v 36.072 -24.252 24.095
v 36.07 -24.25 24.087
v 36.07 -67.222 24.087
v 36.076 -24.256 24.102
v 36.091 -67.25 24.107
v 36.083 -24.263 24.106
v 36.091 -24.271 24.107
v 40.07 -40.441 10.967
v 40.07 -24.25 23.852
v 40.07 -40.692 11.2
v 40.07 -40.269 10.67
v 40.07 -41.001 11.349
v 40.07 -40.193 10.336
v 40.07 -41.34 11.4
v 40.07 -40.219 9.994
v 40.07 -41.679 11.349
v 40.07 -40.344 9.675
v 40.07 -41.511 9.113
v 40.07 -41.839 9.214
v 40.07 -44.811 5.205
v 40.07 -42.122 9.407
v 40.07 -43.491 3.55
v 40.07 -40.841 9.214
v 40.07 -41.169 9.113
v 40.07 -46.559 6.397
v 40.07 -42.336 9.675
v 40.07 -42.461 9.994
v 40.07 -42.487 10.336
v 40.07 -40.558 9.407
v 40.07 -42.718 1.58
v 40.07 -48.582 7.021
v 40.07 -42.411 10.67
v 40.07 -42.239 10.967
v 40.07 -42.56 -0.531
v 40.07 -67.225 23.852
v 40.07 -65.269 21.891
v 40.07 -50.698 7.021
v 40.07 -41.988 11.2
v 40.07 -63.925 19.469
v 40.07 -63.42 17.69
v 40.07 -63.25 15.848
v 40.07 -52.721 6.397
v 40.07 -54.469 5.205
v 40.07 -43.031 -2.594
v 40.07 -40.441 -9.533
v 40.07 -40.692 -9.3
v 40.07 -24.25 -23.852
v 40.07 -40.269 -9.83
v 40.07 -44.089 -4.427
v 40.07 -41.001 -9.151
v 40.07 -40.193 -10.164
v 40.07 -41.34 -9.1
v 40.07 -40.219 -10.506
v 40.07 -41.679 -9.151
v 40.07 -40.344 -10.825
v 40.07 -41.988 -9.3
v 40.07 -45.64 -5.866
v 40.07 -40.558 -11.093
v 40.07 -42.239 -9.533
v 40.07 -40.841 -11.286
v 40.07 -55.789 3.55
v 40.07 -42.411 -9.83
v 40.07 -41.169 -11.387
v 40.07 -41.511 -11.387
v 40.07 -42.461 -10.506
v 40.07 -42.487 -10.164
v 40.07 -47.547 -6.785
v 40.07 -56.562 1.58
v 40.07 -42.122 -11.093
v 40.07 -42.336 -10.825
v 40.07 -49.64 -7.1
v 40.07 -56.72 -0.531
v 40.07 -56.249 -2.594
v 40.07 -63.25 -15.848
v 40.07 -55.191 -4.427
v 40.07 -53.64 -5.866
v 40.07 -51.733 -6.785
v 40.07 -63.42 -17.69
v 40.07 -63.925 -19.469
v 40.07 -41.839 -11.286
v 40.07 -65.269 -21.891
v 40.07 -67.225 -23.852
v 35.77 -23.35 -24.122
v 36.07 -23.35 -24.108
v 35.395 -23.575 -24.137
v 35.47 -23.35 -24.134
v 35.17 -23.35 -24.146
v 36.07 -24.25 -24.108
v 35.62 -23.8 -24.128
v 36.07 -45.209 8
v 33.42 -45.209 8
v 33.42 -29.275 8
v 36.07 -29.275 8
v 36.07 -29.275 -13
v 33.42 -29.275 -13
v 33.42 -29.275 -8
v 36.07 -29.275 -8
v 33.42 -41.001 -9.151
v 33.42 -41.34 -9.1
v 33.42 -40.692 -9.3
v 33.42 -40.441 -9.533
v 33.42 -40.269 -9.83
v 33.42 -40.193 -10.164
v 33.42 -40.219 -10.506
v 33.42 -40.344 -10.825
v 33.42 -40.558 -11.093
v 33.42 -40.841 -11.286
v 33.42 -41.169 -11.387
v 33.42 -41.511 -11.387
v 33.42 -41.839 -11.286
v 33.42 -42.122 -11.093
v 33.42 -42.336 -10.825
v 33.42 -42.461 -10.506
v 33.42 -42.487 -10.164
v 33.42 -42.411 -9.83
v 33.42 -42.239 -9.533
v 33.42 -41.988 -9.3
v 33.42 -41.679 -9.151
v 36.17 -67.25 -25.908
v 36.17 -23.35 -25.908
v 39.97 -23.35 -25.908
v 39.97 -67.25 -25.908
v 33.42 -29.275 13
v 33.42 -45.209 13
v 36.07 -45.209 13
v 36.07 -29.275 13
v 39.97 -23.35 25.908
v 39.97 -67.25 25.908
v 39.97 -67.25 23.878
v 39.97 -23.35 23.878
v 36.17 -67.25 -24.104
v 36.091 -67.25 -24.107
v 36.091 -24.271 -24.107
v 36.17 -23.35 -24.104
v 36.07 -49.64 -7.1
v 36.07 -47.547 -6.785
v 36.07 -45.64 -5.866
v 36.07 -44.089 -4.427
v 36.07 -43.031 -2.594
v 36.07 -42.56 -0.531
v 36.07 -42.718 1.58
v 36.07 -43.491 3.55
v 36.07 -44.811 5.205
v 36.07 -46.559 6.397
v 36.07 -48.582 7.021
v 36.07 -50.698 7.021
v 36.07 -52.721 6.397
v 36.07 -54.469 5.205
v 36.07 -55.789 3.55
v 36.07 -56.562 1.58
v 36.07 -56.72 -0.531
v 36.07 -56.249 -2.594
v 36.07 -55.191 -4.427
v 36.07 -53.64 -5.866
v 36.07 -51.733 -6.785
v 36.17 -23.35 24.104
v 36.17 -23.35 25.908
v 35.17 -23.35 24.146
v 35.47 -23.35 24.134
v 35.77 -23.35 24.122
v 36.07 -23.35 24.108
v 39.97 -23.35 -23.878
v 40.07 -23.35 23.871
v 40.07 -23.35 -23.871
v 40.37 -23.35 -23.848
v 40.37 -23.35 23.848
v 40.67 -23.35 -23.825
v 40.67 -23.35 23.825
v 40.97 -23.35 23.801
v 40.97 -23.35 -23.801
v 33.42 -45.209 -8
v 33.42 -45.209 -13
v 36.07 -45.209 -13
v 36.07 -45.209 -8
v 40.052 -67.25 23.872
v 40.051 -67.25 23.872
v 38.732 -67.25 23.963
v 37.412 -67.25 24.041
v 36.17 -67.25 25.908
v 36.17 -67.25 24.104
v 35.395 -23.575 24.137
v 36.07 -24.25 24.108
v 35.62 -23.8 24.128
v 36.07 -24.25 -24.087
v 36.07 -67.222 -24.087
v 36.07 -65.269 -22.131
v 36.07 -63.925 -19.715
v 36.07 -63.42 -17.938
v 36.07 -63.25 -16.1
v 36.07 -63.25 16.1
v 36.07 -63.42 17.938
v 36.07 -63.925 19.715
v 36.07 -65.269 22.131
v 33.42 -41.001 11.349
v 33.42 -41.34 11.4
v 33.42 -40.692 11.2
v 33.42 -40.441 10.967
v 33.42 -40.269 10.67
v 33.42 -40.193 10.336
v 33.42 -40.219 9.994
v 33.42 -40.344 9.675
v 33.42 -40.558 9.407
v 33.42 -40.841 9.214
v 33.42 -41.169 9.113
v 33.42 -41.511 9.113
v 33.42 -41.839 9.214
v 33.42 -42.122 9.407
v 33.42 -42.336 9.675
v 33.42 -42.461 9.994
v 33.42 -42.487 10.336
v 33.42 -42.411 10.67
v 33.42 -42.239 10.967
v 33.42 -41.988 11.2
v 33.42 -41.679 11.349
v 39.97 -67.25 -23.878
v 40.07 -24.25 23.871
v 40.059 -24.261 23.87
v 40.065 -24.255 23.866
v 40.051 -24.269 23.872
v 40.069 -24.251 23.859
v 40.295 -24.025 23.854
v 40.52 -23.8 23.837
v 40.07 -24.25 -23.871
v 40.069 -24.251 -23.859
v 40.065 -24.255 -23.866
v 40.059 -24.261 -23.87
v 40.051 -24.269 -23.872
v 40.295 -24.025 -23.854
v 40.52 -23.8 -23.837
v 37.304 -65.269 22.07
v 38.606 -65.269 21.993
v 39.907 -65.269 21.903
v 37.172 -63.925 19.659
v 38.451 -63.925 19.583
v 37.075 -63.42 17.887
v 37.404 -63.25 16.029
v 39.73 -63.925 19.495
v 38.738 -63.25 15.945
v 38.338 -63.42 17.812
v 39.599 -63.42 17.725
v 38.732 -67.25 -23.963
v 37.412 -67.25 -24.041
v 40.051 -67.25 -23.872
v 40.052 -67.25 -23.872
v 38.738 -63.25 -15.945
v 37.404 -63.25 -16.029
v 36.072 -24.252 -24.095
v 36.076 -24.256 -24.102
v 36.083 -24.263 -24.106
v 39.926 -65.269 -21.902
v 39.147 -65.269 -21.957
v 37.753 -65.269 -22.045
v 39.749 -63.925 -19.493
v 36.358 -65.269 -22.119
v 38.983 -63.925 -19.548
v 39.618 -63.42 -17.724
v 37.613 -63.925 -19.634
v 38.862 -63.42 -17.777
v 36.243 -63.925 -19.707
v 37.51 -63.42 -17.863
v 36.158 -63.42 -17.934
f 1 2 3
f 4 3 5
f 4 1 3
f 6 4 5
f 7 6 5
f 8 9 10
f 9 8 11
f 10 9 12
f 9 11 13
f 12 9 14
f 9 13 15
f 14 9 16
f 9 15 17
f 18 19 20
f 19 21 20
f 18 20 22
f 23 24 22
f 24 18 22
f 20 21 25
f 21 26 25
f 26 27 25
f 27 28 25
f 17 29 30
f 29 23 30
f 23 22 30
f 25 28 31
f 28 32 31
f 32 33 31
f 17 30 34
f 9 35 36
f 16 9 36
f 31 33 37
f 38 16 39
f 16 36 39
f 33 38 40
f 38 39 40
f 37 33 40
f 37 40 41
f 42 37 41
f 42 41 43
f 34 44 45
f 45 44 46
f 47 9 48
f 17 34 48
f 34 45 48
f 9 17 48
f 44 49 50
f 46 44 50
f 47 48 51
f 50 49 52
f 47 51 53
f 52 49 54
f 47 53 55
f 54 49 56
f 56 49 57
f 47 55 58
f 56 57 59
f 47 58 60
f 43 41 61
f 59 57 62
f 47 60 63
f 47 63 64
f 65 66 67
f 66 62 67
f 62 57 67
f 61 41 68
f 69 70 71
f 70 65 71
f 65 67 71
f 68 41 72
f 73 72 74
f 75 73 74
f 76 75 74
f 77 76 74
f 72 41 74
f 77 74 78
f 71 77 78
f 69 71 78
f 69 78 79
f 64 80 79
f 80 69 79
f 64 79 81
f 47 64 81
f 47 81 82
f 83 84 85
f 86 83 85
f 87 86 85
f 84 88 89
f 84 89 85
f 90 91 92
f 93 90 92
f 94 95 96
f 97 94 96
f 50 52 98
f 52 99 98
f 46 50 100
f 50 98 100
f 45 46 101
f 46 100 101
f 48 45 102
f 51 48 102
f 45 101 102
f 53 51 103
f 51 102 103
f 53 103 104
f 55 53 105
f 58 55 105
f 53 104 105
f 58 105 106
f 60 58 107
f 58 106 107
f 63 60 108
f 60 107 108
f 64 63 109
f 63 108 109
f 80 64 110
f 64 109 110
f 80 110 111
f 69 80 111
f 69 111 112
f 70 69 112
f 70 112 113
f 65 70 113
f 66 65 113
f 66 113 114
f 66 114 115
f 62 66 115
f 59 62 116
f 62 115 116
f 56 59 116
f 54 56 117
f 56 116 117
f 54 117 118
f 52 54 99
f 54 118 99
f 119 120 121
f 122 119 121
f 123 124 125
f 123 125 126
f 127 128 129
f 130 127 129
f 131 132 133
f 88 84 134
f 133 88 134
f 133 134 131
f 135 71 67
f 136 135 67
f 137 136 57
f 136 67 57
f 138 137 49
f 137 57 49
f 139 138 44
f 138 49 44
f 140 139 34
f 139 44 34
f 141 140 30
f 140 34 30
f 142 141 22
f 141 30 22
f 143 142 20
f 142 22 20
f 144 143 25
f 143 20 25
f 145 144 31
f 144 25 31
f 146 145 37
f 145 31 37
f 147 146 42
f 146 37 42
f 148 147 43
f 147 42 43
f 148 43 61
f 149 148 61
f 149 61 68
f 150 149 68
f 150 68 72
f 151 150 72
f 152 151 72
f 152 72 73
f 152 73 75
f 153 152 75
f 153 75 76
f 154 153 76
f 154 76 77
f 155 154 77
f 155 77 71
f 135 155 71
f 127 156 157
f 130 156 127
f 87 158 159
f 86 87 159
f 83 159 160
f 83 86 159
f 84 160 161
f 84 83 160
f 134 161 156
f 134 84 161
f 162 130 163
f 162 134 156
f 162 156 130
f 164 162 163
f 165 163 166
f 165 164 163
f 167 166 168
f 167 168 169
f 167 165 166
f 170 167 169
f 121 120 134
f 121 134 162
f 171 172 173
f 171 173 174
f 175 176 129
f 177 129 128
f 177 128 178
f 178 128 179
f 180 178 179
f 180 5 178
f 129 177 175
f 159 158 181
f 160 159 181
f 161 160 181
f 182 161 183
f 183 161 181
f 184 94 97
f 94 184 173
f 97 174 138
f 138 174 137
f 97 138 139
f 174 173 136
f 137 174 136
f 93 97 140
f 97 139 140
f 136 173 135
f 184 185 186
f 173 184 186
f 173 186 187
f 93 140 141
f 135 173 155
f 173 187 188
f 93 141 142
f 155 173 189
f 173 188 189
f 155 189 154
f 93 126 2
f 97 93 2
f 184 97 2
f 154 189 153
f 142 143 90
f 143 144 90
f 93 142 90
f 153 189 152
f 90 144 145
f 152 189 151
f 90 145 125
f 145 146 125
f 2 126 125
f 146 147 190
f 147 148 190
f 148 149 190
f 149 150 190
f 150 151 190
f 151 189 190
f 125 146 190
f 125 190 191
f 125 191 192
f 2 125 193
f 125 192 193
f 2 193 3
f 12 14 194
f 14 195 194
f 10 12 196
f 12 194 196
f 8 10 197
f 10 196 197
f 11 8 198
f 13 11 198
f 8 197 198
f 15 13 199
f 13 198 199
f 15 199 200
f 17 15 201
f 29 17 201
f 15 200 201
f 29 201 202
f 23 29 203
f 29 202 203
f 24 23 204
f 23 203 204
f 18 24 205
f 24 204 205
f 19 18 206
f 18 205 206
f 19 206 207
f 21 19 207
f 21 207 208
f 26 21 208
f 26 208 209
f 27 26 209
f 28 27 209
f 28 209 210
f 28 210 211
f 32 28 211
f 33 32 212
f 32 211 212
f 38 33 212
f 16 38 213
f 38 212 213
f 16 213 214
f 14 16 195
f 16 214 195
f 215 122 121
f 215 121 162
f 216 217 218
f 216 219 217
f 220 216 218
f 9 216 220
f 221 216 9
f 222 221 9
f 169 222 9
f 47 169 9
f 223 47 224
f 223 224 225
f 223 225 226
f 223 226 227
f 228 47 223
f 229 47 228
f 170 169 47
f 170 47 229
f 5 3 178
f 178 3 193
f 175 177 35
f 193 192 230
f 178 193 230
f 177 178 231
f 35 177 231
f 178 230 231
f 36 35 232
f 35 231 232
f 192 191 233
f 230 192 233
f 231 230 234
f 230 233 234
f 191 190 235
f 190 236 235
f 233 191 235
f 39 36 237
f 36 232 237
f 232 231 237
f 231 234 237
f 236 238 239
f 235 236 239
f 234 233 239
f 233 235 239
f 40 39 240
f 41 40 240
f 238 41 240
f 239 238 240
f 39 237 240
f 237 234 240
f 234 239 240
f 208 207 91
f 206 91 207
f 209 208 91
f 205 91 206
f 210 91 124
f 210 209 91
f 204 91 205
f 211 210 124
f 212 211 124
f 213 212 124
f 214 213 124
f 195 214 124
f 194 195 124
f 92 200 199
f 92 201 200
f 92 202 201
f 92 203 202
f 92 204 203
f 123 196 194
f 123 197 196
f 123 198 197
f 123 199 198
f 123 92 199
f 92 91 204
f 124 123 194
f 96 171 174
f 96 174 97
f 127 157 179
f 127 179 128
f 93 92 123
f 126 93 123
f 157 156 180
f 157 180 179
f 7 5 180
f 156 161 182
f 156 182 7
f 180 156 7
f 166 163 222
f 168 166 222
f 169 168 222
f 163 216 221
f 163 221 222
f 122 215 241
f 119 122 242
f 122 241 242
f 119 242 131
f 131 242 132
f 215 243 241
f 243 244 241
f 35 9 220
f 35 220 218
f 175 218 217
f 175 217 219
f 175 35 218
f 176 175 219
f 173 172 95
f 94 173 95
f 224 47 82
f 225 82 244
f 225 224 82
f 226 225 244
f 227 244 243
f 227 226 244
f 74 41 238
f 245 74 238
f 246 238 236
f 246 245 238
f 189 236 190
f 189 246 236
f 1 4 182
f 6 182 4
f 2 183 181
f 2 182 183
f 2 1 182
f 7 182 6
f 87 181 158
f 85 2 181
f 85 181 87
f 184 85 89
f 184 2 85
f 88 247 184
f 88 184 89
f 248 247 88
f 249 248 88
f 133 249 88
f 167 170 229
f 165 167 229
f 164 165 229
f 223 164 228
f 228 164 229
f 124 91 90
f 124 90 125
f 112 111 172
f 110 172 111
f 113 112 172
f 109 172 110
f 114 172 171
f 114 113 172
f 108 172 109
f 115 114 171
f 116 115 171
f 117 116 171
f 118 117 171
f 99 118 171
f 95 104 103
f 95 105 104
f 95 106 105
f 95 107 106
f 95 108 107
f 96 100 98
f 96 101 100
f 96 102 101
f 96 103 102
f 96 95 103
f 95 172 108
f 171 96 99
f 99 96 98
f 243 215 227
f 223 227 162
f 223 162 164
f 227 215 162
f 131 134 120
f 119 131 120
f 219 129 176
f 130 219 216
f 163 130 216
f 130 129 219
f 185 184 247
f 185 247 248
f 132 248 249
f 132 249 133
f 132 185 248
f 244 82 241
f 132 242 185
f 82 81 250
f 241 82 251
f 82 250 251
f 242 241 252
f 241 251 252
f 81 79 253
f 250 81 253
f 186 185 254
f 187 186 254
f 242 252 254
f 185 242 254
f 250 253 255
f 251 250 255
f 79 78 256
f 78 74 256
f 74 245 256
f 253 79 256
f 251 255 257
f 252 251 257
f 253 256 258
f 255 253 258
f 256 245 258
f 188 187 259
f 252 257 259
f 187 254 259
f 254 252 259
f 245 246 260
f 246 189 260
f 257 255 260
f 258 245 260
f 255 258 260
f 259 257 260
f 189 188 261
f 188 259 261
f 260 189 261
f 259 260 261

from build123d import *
from build123d.topology import SkipClean

# Parameters (mm, degrees)
SKETCH1_R                = 4.1
SKETCH1_R_2              = 1.15
BOSS_EXTRUDE1_DEPTH      = 3.5
BOSS_EXTRUDE2_DEPTH      = 67.25
CUT_EXTRUDE1_DEPTH       = 94.994268442
SKETCH4_W                = 26.5
SKETCH4_H                = 47.25
CUT_EXTRUDE2_DEPTH       = 3.5
SKETCH6_W                = 31.5
SKETCH6_H                = 52.25
BOSS_EXTRUDE3_DEPTH      = 2
CHAMFER2_SIZE            = 2
SKETCH7_W                = 26.5
SKETCH7_H                = 47.25
CUT_EXTRUDE3_DEPTH       = 0.8
CUT_EXTRUDE4_REACH       = 97.271
SKETCH8_W                = 21.401119101
SKETCH8_H                = 6.5
CUT_EXTRUDE5_REACH       = 97.271
SKETCH9_R                = 7.1
BOSS_EXTRUDE4_DEPTH      = 3.5
SKETCH11_W               = 4
SKETCH11_H               = 49.717369648
BOSS_EXTRUDE5_DEPTH      = 40
SKETCH12_R               = 7.1
CUT_EXTRUDE6_DEPTH       = 10
CHAMFER3_SIZE            = 1
CHAMFER4_SIZE            = 1
SKETCH13_R               = 9
SKETCH13_R_2             = 5.5
BOSS_EXTRUDE6_DEPTH      = 1.5
SKETCH16_R               = 9
BOSS_EXTRUDE7_DEPTH      = 1
FILLET2_R                = 1
SKETCH18_R               = 9
SKETCH18_R_2             = 7.1
BOSS_EXTRUDE8_DEPTH      = 0.5
CHAMFER5_SIZE            = 0.5
BOSS_EXTRUDE9_DEPTH      = 40.5
CUT_EXTRUDE8_REACH       = 129.458
CHAMFER6_SIZE            = 1.5
CUT_EXTRUDE9_REACH       = 129.458
SKETCH20_R               = 7.1
SKETCH21_R               = 1.5
BOSS_EXTRUDE10_DEPTH     = 3.5
CUT_EXTRUDE10_REACH      = 129.458
SKETCH22_R               = 3.75
SKETCH23_R               = 1.15
BOSS_EXTRUDE11_DEPTH     = 1.82
BOSS_EXTRUDE12_START     = 2.65
SKETCH24_W               = 5
SKETCH24_H               = 15.934069979
SKETCH24_R               = 1.15
BOSS_EXTRUDE12_DEPTH     = 2.65
CUT_EXTRUDE11_REACH      = 118.561
SKETCH25_R               = 1.15
SKETCH26_R               = 13.375
CUT_EXTRUDE12_DEPTH      = 3.3
SKETCH27_R               = 5
BOSS_EXTRUDE13_DEPTH     = 1
FILLET7_R                = 0.75
SKETCH28_R               = 8
SKETCH28_R_2             = 4.1
BOSS_EXTRUDE14_DEPTH     = 1.5
SKETCH29_R               = 8
SKETCH29_R_2             = 4.1
BOSS_EXTRUDE15_DEPTH     = 8.5
CUT_EXTRUDE13_DEPTH      = 15
CUT_EXTRUDE13_DEPTH_BACK = 127.447026853
SKETCH30_R               = 1.125
SKETCH31_R               = 7.1
BOSS_EXTRUDE16_DEPTH     = 0.5
CHAMFER7_SIZE            = 0.5
CHAMFER7_OF_MIRROR5_SIZE = 0.5
FILLET8_R                = 2.5
CUT_EXTRUDE14_DEPTH      = 10
CUT_EXTRUDE14_DEPTH_BACK = 10
SKETCH32_W               = 30.5
SKETCH32_H               = 23.22
FILLET9_R                = 5
CUT_EXTRUDE15_DEPTH      = 2
SKETCH34_R               = 2.25
CUT_EXTRUDE16_DEPTH      = 1.5
CUT_EXTRUDE17_DEPTH      = 133.651095359
CUT_EXTRUDE17_DEPTH_BACK = 2
SKETCH35_W               = 15
SKETCH35_H               = 21.75
FILLET10_R               = 1
FILLET11_R               = 1
SKETCH36_R               = 1.15
CUT_EXTRUDE18_DEPTH      = 127.188133357
CUT_EXTRUDE24_DEPTH      = 107.374679788
CUT_EXTRUDE24_DEPTH_BACK = 107.374679788
SKETCH39_W               = 129.097632358
SKETCH39_H               = 90.611923089
CUT_EXTRUDE25_DEPTH      = 69.011167635
CUT_EXTRUDE25_DEPTH_BACK = 3.5
SKETCH40_W               = 54.925006482
SKETCH40_H               = 71.748882342
CUT_EXTRUDE26_DEPTH      = 66.567961717
FILLET12_R               = 10
CUT_EXTRUDE27_DEPTH      = 0.1
FILLET13_R               = 0.02


# Some blends are built 0.0001 mm under size
with BuildPart() as part:
    # Sketch1 → Boss-Extrude1 (new body)
    with BuildSketch(Plane(origin=(0, 0, 0), x_dir=(0, 0, -1), z_dir=(1, 0, 0))):
        with BuildLine():
            Line((-17.25, 0), (-17.25, -67.25))
            Line((-17.25, -67.25), (17.25, -67.25))
            Line((17.25, -67.25), (17.25, 0))
            ThreePointArc((17.25, 0), (0, 17.25), (-17.25, 0))
        make_face()
        Circle(SKETCH1_R, mode=Mode.SUBTRACT)
        with Locations((0, 8.125)):
            Circle(SKETCH1_R_2, mode=Mode.SUBTRACT)
        with Locations((8.125, 0)):
            Circle(SKETCH1_R_2, mode=Mode.SUBTRACT)
        with Locations((-8.125, 0)):
            Circle(SKETCH1_R_2, mode=Mode.SUBTRACT)
        with Locations((0, -8.125)):
            Circle(SKETCH1_R_2, mode=Mode.SUBTRACT)
    boss_extrude1 = extrude(amount=BOSS_EXTRUDE1_DEPTH)

    # Sketch2 → Boss-Extrude2 (add)
    with BuildSketch(Plane(origin=(0, 0, 0), x_dir=(-1, 0, 0), z_dir=(0, -1, 0))):
        with BuildLine():
            Line((-59.4, -17.25), (-59.4, -20.25))
            ThreePointArc((-59.4, -20.25), (-58.989582055, -21.693064324), (-58.079872716, -22.886088403))
            ThreePointArc((-58.079872716, -22.886088403), (-54.454905265, -25.285822393), (-50.289145158, -26.529025904))
            ThreePointArc((-50.289145158, -26.529025904), (-40.020812264, -27.631788405), (-29.7, -28))
            ThreePointArc((-29.7, -28), (-19.379187736, -27.631788405), (-9.110854842, -26.529025904))
            ThreePointArc((-9.110854842, -26.529025904), (-4.945094735, -25.285822393), (-1.320127284, -22.886088403))
            ThreePointArc((-1.320127284, -22.886088403), (-0.410417945, -21.693064324), (0, -20.25))
            Line((0, -20.25), (0, -17.25))
            Line((0, -17.25), (-3.5, -17.25))
            Line((-3.5, -17.25), (-3.735903774, -19.954735321))
            ThreePointArc((-3.735903774, -19.954735321), (-3.770225997, -20.037754997), (-3.828562802, -20.106071165))
            ThreePointArc((-3.828562802, -20.106071165), (-6.407189742, -21.835001354), (-9.364778442, -22.779027613))
            ThreePointArc((-9.364778442, -22.779027613), (-19.505740765, -23.883479028), (-29.7, -24.2522722))
            ThreePointArc((-29.7, -24.2522722), (-39.894259235, -23.883479028), (-50.035221558, -22.779027613))
            ThreePointArc((-50.035221558, -22.779027613), (-52.992810258, -21.835001354), (-55.571437198, -20.106071165))
            ThreePointArc((-55.571437198, -20.106071165), (-55.629774003, -20.037754997), (-55.664096226, -19.954735321))
            Line((-55.664096226, -19.954735321), (-55.9, -17.25))
            Line((-55.9, -17.25), (-59.4, -17.25))
        make_face()
    boss_extrude2 = extrude(amount=BOSS_EXTRUDE2_DEPTH)

    # Mirror2: Boss-Extrude1 across plane
    add(boss_extrude1.mirror(Plane.ZY.offset(-29.7)))

    # Sketch3 → Cut-Extrude1 (cut, through all)
    with BuildSketch(Plane.ZY):
        Polygon((17.25, 0), (32.748612496, -8.948128097), (32.748612496, 0), align=None)
    cut_extrude1 = extrude(amount=-CUT_EXTRUDE1_DEPTH, mode=Mode.SUBTRACT)

    # Mirror3: Boss-Extrude2, Cut-Extrude1 across plane
    add(boss_extrude2.mirror(Plane(origin=(0, 0, 0), x_dir=(1, 0, 0), z_dir=(0, 0, -1))))
    add(cut_extrude1.mirror(Plane(origin=(0, 0, 0), x_dir=(1, 0, 0), z_dir=(0, 0, -1))), mode=Mode.SUBTRACT)

    # Sketch4 → Cut-Extrude2 (cut)
    with BuildSketch(Plane.ZY):
        with Locations((0, -37.125)):
            Rectangle(SKETCH4_W, SKETCH4_H)
    extrude(amount=-CUT_EXTRUDE2_DEPTH, mode=Mode.SUBTRACT)

    # Sketch6 → Boss-Extrude3 (add)
    with BuildSketch(Plane.ZY):
        with Locations((0, -37.125)):
            Rectangle(SKETCH6_W, SKETCH6_H)
    extrude(amount=BOSS_EXTRUDE3_DEPTH)

    # Chamfer2
    chamfer2_edges = [part.edges().sort_by_distance(p)[0] for p in [
        (-2, -63.25, 0),
        (-2, -37.125, 15.75),
        (-2, -37.125, -15.75),
        (-2, -11, 0),
    ]]
    chamfer(chamfer2_edges, length=CHAMFER2_SIZE - 0.0001)  # a hair under: the kernel refuses the full size

    # Sketch7 → Cut-Extrude3 (cut)
    with BuildSketch(Plane(origin=(0, 0, 0), x_dir=(0, 0, -1), z_dir=(1, 0, 0))):
        with Locations((0, -37.125)):
            Rectangle(SKETCH7_W, SKETCH7_H)
    extrude(amount=-CUT_EXTRUDE3_DEPTH, mode=Mode.SUBTRACT)

    # Sketch8 → Cut-Extrude4 (cut, up to next)
    with BuildSketch(Plane.ZY.offset(2), mode=Mode.PRIVATE) as cut_extrude4_sk1:
        with Locations((0.049440449, -35.5)):
            Rectangle(SKETCH8_W, SKETCH8_H)
    cut_extrude4_tool1 = extrude(cut_extrude4_sk1.sketch, amount=-CUT_EXTRUDE4_REACH, mode=Mode.PRIVATE) & part.part
    add(cut_extrude4_tool1.solids().sort_by_distance((-2, -35.5, 0.04944))[0], mode=Mode.SUBTRACT)

    # Sketch9 → Cut-Extrude5 (cut, up to next)
    with BuildSketch(Plane(origin=(59.4, 0, 0), x_dir=(0, 0, -1), z_dir=(1, 0, 0)), mode=Mode.PRIVATE) as cut_extrude5_sk1:
        with Locations((0, -49.64)):
            Circle(SKETCH9_R)
    cut_extrude5_tool1 = extrude(cut_extrude5_sk1.sketch, amount=-CUT_EXTRUDE5_REACH, mode=Mode.PRIVATE) & part.part
    add(cut_extrude5_tool1.solids().sort_by_distance((59.4, -49.64, 0))[0], mode=Mode.SUBTRACT)

    # Sketch10 → Boss-Extrude4 (add)
    with BuildSketch(Plane(origin=(0, -19.75, 0), x_dir=(-1, 0, 0), z_dir=(0, -1, 0))):
        with BuildLine():
            Line((-55.664096226, -19.954735321), (-55.9, -17.25))
            Line((-55.9, -17.25), (-55.9, 17.25))
            Line((-55.9, 17.25), (-55.664096226, 19.954735321))
            ThreePointArc((-55.664096226, 19.954735321), (-55.629774003, 20.037754997), (-55.571437198, 20.106071165))
            ThreePointArc((-55.571437198, 20.106071165), (-52.992810258, 21.835001354), (-50.035221558, 22.779027613))
            ThreePointArc((-50.035221558, 22.779027613), (-29.7, 24.2522722), (-9.364778442, 22.779027613))
            ThreePointArc((-9.364778442, 22.779027613), (-6.407189742, 21.835001354), (-3.828562802, 20.106071165))
            ThreePointArc((-3.828562802, 20.106071165), (-3.770225997, 20.037754997), (-3.735903774, 19.954735321))
            Line((-3.735903774, 19.954735321), (-3.5, 17.25))
            Line((-3.5, 17.25), (-3.5, 12.559999042))
            Line((-3.5, 12.559999042), (-34.519998723, 12.559999042))
            Line((-34.519998723, 12.559999042), (-34.519998723, -12.559999407))
            Line((-34.519998723, -12.559999407), (-3.5, -12.559999407))
            Line((-3.5, -12.559999407), (-3.5, -17.25))
            Line((-3.5, -17.25), (-3.735903774, -19.954735321))
            ThreePointArc((-3.735903774, -19.954735321), (-3.770225997, -20.037754997), (-3.828562802, -20.106071165))
            ThreePointArc((-3.828562802, -20.106071165), (-6.407189742, -21.835001354), (-9.364778442, -22.779027613))
            ThreePointArc((-9.364778442, -22.779027613), (-29.7, -24.2522722), (-50.035221558, -22.779027613))
            ThreePointArc((-50.035221558, -22.779027613), (-52.992810258, -21.835001354), (-55.571437198, -20.106071165))
            ThreePointArc((-55.571437198, -20.106071165), (-55.629774003, -20.037754997), (-55.664096226, -19.954735321))
        make_face()
    extrude(amount=BOSS_EXTRUDE4_DEPTH)

    # Sketch11 → Boss-Extrude5 (add)
    with BuildSketch(Plane(origin=(0, -23.25, 0), x_dir=(-1, 0, 0), z_dir=(0, -1, 0))):
        with Locations((-38.07, 0.750293773)):
            Rectangle(SKETCH11_W, SKETCH11_H)
    extrude(amount=BOSS_EXTRUDE5_DEPTH)

    # Sketch12 → Cut-Extrude6 (cut)
    with BuildSketch(Plane(origin=(40.07, 0, 0), x_dir=(0, 0, -1), z_dir=(1, 0, 0))):
        with Locations((0, -49.64)):
            Circle(SKETCH12_R)
    extrude(amount=-CUT_EXTRUDE6_DEPTH, mode=Mode.SUBTRACT)

    # Chamfer3
    chamfer3_edges = [part.edges().sort_by_distance(p)[0] for p in [
        (36.07, -23.25, 0),
    ]]
    chamfer(chamfer3_edges, length=CHAMFER3_SIZE)

    # Chamfer4
    chamfer4_edges = [part.edges().sort_by_distance(p)[0] for p in [
        (40.07, -23.25, 0),
    ]]
    chamfer(chamfer4_edges, length=CHAMFER4_SIZE)

    # Sketch13 → Boss-Extrude6 (add)
    with BuildSketch(Plane(origin=(59.4, 0, 0), x_dir=(0, 0, -1), z_dir=(1, 0, 0))):
        with Locations(Location((0, -49.64, 0), (0, 0, 180))):
            Circle(SKETCH13_R)
        with Locations((0, -49.64)):
            Circle(SKETCH13_R_2, mode=Mode.SUBTRACT)
    extrude(amount=BOSS_EXTRUDE6_DEPTH)

    # Sketch16 → Boss-Extrude7 (add)
    with BuildSketch(Plane(origin=(60.9, 0, 0), x_dir=(0, 0, -1), z_dir=(1, 0, 0))):
        with Locations(Location((0, -49.64, 0), (0, 0, 180))):
            Circle(SKETCH16_R)
    extrude(amount=BOSS_EXTRUDE7_DEPTH)

    # Fillet2
    fillet2_edges = [part.edges().sort_by_distance(p)[0] for p in [
        (61.9, -49.64, -9),
    ]]
    fillet(fillet2_edges, radius=FILLET2_R)

    # Sketch18 → Boss-Extrude8 (add)
    with BuildSketch(Plane.ZY.offset(-55.9)):
        with Locations((0, -49.64)):
            Circle(SKETCH18_R)
        with Locations(Location((0, -49.64, 0), (0, 0, 180))):
            Circle(SKETCH18_R_2, mode=Mode.SUBTRACT)
    extrude(amount=BOSS_EXTRUDE8_DEPTH)

    # Chamfer5
    chamfer5_edges = [part.edges().sort_by_distance(p)[0] for p in [
        (55.9, -49.64, -9),
    ]]
    chamfer(chamfer5_edges, length=CHAMFER5_SIZE - 0.0001)  # a hair under: the kernel refuses the full size

    # Sketch17 → Boss-Extrude9 (add)
    with BuildSketch(Plane(origin=(0, 0, 20.25), x_dir=(-1, 0, 0), z_dir=(0, 0, -1))):
        Polygon((-59.65, -105.91), (-63.15, -105.91), (-63.15, -67.5), (-59.4, -63.75), (-59.4, -67.25), (-55.9, -67.25), (-59.65, -71), align=None)
    boss_extrude9 = extrude(amount=BOSS_EXTRUDE9_DEPTH)

    # Sketch19 → Cut-Extrude8 (cut, up to next)
    with BuildSketch(Plane(origin=(63.15, 0, 0), x_dir=(0, 0, -1), z_dir=(1, 0, 0)), mode=Mode.PRIVATE) as cut_extrude8_sk1:
        with BuildLine():
            ThreePointArc((0, -105.91), (-12.515790027, -100.725790027), (-17.7, -88.21))
            Line((-17.7, -88.21), (-20.25, -85.66))
            Line((-20.25, -85.66), (-20.25, -105.91))
            Line((-20.25, -105.91), (0, -105.91))
        make_face()
    cut_extrude8_tool1 = extrude(cut_extrude8_sk1.sketch, amount=-CUT_EXTRUDE8_REACH, mode=Mode.PRIVATE) & part.part
    # Sketch19 → Cut-Extrude8 (cut, up to next)
    with BuildSketch(Plane(origin=(63.15, 0, 0), x_dir=(0, 0, -1), z_dir=(1, 0, 0)), mode=Mode.PRIVATE) as cut_extrude8_sk2:
        with BuildLine():
            ThreePointArc((17.7, -88.21), (12.515790027, -100.725790027), (0, -105.91))
            Line((0, -105.91), (20.25, -105.91))
            Line((20.25, -105.91), (20.25, -85.66))
            Line((20.25, -85.66), (17.7, -88.21))
        make_face()
    cut_extrude8_tool2 = extrude(cut_extrude8_sk2.sketch, amount=-CUT_EXTRUDE8_REACH, mode=Mode.PRIVATE) & part.part
    cut_extrude8_1 = cut_extrude8_tool1.solids().sort_by_distance((63.15, -99.634492, 15.946502))[0]
    add(cut_extrude8_1, mode=Mode.SUBTRACT)
    cut_extrude8_2 = cut_extrude8_tool2.solids().sort_by_distance((63.15, -99.634492, -15.946502))[0]
    add(cut_extrude8_2, mode=Mode.SUBTRACT)
    cut_extrude8 = cut_extrude8_1 + cut_extrude8_2  # Cut-Extrude8 as one shape, for the pattern or mirror that repeats it

    # Chamfer6
    chamfer6_edges = [part.edges().sort_by_distance(p)[0] for p in [
        (59.4, -49.64, -9),
    ]]
    chamfer(chamfer6_edges, length=CHAMFER6_SIZE - 0.0001)  # a hair under: the kernel refuses the full size

    # Sketch20 → Cut-Extrude9 (cut, up to next)
    with BuildSketch(Plane(origin=(63.15, 0, 0), x_dir=(0, 0, -1), z_dir=(1, 0, 0)), mode=Mode.PRIVATE) as cut_extrude9_sk1:
        with Locations(Location((0, -88.21, 0), (0, 0, 90))):
            Circle(SKETCH20_R)
    cut_extrude9_tool1 = extrude(cut_extrude9_sk1.sketch, amount=-CUT_EXTRUDE9_REACH, mode=Mode.PRIVATE) & part.part
    cut_extrude9 = cut_extrude9_tool1.solids().sort_by_distance((63.15, -88.21, 0))[0]
    add(cut_extrude9, mode=Mode.SUBTRACT)

    # Sketch21 → Boss-Extrude10 (add)
    with BuildSketch(Plane.ZY):
        with Locations((0, 8.125)):
            Circle(SKETCH21_R)
        with Locations((8.125, 0)):
            Circle(SKETCH21_R)
        with Locations((0, -8.125)):
            Circle(SKETCH21_R)
        with Locations((-8.125, 0)):
            Circle(SKETCH21_R)
    extrude(amount=-BOSS_EXTRUDE10_DEPTH)

    # Mirror4: Boss-Extrude9, Cut-Extrude8, Cut-Extrude9 across plane
    add(boss_extrude9.mirror(Plane.ZY.offset(-29.7)))
    add(cut_extrude8.mirror(Plane.ZY.offset(-29.7)), mode=Mode.SUBTRACT)
    add(cut_extrude9.mirror(Plane.ZY.offset(-29.7)), mode=Mode.SUBTRACT)

    # Sketch22 → Cut-Extrude10 (cut, up to next)
    with BuildSketch(Plane.ZY.offset(2), mode=Mode.PRIVATE) as cut_extrude10_sk1:
        with Locations((0, -49.64)):
            Circle(SKETCH22_R)
    cut_extrude10_tool1 = extrude(cut_extrude10_sk1.sketch, amount=-CUT_EXTRUDE10_REACH, mode=Mode.PRIVATE) & part.part
    add(cut_extrude10_tool1.solids().sort_by_distance((-2, -49.64, 0))[0], mode=Mode.SUBTRACT)

    # Sketch23 → Boss-Extrude11 (add)
    with BuildSketch(Plane(origin=(-0.8, 0, 0), x_dir=(0, 0, -1), z_dir=(1, 0, 0))):
        with BuildLine():
            Line((10.8, -38.889999996), (6.999999457, -38.890000068))
            Line((6.999999457, -38.890000068), (6.999996312, -40.653616778))
            ThreePointArc((6.999996312, -40.653616778), (8.489057136, -42.044544733), (9.706479797, -43.678516819))
            Line((9.706479797, -43.678516819), (11.359988862, -43.678515032))
            ThreePointArc((11.359988862, -43.678515032), (11.713588357, -43.532032852), (11.859995379, -43.178403539))
            Line((11.859995379, -43.178403539), (11.86002914, -16.529542904))
            add(Edge.make_bspline(
                [(11.86002914, -16.529542904), (11.860165313, -16.430469267), (11.850209846, -16.333113479), (11.811929636, -16.141528813), (11.783134355, -16.046307589), (11.707972993, -15.864777212), (11.661801756, -15.778752889), (11.553004371, -15.615785201), (11.48982416, -15.538574617), (11.282494862, -15.331229176), (11.115347595, -15.219447642), (10.754781823, -15.069949312), (10.558116563, -15.029804422), (10.360121847, -15.029962825)],
                knots=[0, 0, 0, 0, 0.125, 0.125, 0.25, 0.25, 0.375, 0.375, 0.5, 0.5, 0.75, 0.75, 1, 1, 1, 1], degree=3))
            Line((10.360121847, -15.029962825), (-10.360414785, -15.029965499))
            add(Edge.make_bspline(
                [(-10.360414785, -15.029965499), (-10.459488561, -15.029826786), (-10.556844718, -15.039779883), (-10.748430568, -15.078055492), (-10.843652616, -15.10684852), (-11.025185073, -15.18200551), (-11.111210651, -15.228174695), (-11.274181245, -15.336968247), (-11.351393467, -15.400146655), (-11.558744183, -15.60747118), (-11.670529896, -15.774615995), (-11.820037045, -16.135178663), (-11.86018697, -16.331843248), (-11.860032668, -16.529838302)],
                knots=[0, 0, 0, 0, 0.125, 0.125, 0.25, 0.25, 0.375, 0.375, 0.5, 0.5, 0.75, 0.75, 1, 1, 1, 1], degree=3))
            Line((-11.860032668, -16.529838302), (-11.860001151, -43.178485794))
            ThreePointArc((-11.860001151, -43.178485794), (-11.713562299, -43.532062592), (-11.359992206, -43.678517633))
            Line((-11.359992206, -43.678517633), (-9.706483935, -43.678519702))
            ThreePointArc((-9.706483935, -43.678519702), (-8.489059663, -42.044544533), (-6.999996328, -40.653614235))
            Line((-6.999996328, -40.653614235), (-6.99999946, -38.890000068))
            Line((-6.99999946, -38.890000068), (-10.8, -38.889999996))
            Line((-10.8, -38.889999996), (-10.8, -32.115))
            Line((-10.8, -32.115), (-9.303042913, -32.115))
            Line((-9.303042913, -32.115), (-9.442286694, -31.892101192))
            Line((-9.442286694, -31.892101192), (-9.442286694, -20.936914675))
            ThreePointArc((-9.442286694, -20.936914675), (-9.09081483, -20.088386539), (-8.242286694, -19.736914678))
            Line((-8.242286694, -19.736914678), (8.242286696, -19.736914678))
            ThreePointArc((8.242286696, -19.736914678), (9.090814832, -20.088386541), (9.442286694, -20.936914678))
            Line((9.442286694, -20.936914678), (9.442286694, -31.892101192))
            Line((9.442286694, -31.892101192), (9.303042913, -32.115))
            Line((9.303042913, -32.115), (10.8, -32.115))
            Line((10.8, -32.115), (10.8, -38.889999996))
        make_face()
        with Locations(Location((-10.25, -16.89, 0), (0, 0, 180))):
            Circle(SKETCH23_R, mode=Mode.SUBTRACT)
        with Locations(Location((10.25, -16.89, 0), (0, 0, 180))):
            Circle(SKETCH23_R, mode=Mode.SUBTRACT)
        with Locations(Location((10.25, -41.34, 0), (0, 0, 180))):
            Circle(SKETCH23_R, mode=Mode.SUBTRACT)
        with Locations(Location((-10.25, -41.34, 0), (0, 0, 180))):
            Circle(SKETCH23_R, mode=Mode.SUBTRACT)
    extrude(amount=BOSS_EXTRUDE11_DEPTH)

    # Sketch24 → Boss-Extrude12 (add)
    # profile 1 of 2: a face of its own
    with BuildSketch(Plane.ZY.offset(-36.07).offset(BOSS_EXTRUDE12_START)):
        with Locations((-10.5, -37.242079847)):
            Rectangle(SKETCH24_W, SKETCH24_H)
        with Locations((-10.25, -41.34)):
            Circle(SKETCH24_R, mode=Mode.SUBTRACT)
    # profile 2 of 2: a face of its own
    with BuildSketch(Plane.ZY.offset(-36.07).offset(BOSS_EXTRUDE12_START)):
        with Locations((10.5, -37.242079847)):
            Rectangle(SKETCH24_W, SKETCH24_H)
        with Locations((10.25, -41.34)):
            Circle(SKETCH24_R, mode=Mode.SUBTRACT)
    extrude(amount=-BOSS_EXTRUDE12_DEPTH)

    # Sketch25 → Cut-Extrude11 (cut, up to next)
    with BuildSketch(Plane.ZY.offset(-36.07), mode=Mode.PRIVATE) as cut_extrude11_sk1:
        with Locations((10.25, -41.34)):
            Circle(SKETCH25_R)
    cut_extrude11_tool1 = extrude(cut_extrude11_sk1.sketch, amount=-CUT_EXTRUDE11_REACH, mode=Mode.PRIVATE) & part.part
    # Sketch25 → Cut-Extrude11 (cut, up to next)
    with BuildSketch(Plane.ZY.offset(-36.07), mode=Mode.PRIVATE) as cut_extrude11_sk2:
        with Locations((-10.25, -41.34)):
            Circle(SKETCH25_R)
    cut_extrude11_tool2 = extrude(cut_extrude11_sk2.sketch, amount=-CUT_EXTRUDE11_REACH, mode=Mode.PRIVATE) & part.part
    add(cut_extrude11_tool1.solids().sort_by_distance((36.07, -41.34, 10.25))[0], mode=Mode.SUBTRACT)
    add(cut_extrude11_tool2.solids().sort_by_distance((36.07, -41.34, -10.25))[0], mode=Mode.SUBTRACT)

    # Sketch26 → Cut-Extrude12 (cut)
    with BuildSketch(Plane.ZY):
        Circle(SKETCH26_R)
    extrude(amount=CUT_EXTRUDE12_DEPTH, mode=Mode.SUBTRACT)

    # Sketch27 → Boss-Extrude13 (add)
    with BuildSketch(Plane.ZY.offset(2)):
        with Locations((0, -49.64)):
            Circle(SKETCH27_R)
    extrude(amount=BOSS_EXTRUDE13_DEPTH)

    # Fillet7
    fillet7_edges = [part.edges().sort_by_distance(p)[0] for p in [
        (-3, -49.64, -5),
    ]]
    fillet(fillet7_edges, radius=FILLET7_R)

    # Sketch28 → Boss-Extrude14 (add)
    with BuildSketch(Plane(origin=(3.5, 0, 0), x_dir=(0, 0, -1), z_dir=(1, 0, 0))):
        Circle(SKETCH28_R)
        Circle(SKETCH28_R_2, mode=Mode.SUBTRACT)
    extrude(amount=BOSS_EXTRUDE14_DEPTH)

    # Sketch29 → Boss-Extrude15 (add)
    with BuildSketch(Plane(origin=(5, 0, 0), x_dir=(0, 0, -1), z_dir=(1, 0, 0))):
        Circle(SKETCH29_R)
        Circle(SKETCH29_R_2, mode=Mode.SUBTRACT)
    extrude(amount=BOSS_EXTRUDE15_DEPTH)

    # Sketch30 → Cut-Extrude13 (cut, two sides: drawn at the far end of the back side and taken through both)
    with BuildSketch(Plane(origin=(0, 0, 0), x_dir=(-1, 0, 0), z_dir=(0, -1, 0)).offset(-CUT_EXTRUDE13_DEPTH_BACK)):
        with Locations(Location((-8.5, 0, 0), (0, 0, 270))):
            Circle(SKETCH30_R)
    extrude(amount=CUT_EXTRUDE13_DEPTH + CUT_EXTRUDE13_DEPTH_BACK, mode=Mode.SUBTRACT)

    # Sketch31 → Boss-Extrude16 (add)
    with SkipClean():  # the faces are left unmerged after this step: merging them gives an invalid solid
        with BuildSketch(Plane.ZY.offset(3.75)):
            with BuildLine():
                Line((-20.25, -67.5), (-20.25, -85.66))
                Line((-20.25, -85.66), (-17.7, -88.21))
                ThreePointArc((-17.7, -88.21), (0, -105.91), (17.7, -88.21))
                Line((17.7, -88.21), (20.25, -85.66))
                Line((20.25, -85.66), (20.25, -67.5))
                Line((20.25, -67.5), (-20.25, -67.5))
            make_face()
            with Locations(Location((0, -88.21, 0), (0, 0, 90))):
                Circle(SKETCH31_R, mode=Mode.SUBTRACT)
        boss_extrude16 = extrude(amount=BOSS_EXTRUDE16_DEPTH)

    # Chamfer7
    chamfer7_edges = [part.edges().sort_by_distance(p)[0] for p in [
        (-4.25, -67.5, 0),
    ]]
    chamfer(chamfer7_edges, length=CHAMFER7_SIZE - 0.0001)  # a hair under: the kernel refuses the full size

    # Mirror5: Boss-Extrude16 across plane
    add(boss_extrude16.mirror(Plane(origin=(29.7, 0, 0), x_dir=(0, 0, 1), z_dir=(1, 0, 0))))

    # Chamfer7 of Mirror5
    chamfer7_of_mirror5_edges = [part.edges().sort_by_distance(p)[0] for p in [
        (63.65, -67.5, 0),
    ]]
    chamfer(chamfer7_of_mirror5_edges, length=CHAMFER7_OF_MIRROR5_SIZE - 0.0001)  # a hair under: the kernel refuses the full size

    # Fillet8
    # the kernel refuses this fillet: 2.5 mm, written as the material it adds along each edge
    with BuildSketch(Plane(origin=(59.65, -71, 20.25), x_dir=(0, -1, 0), z_dir=(0, 0, -1)), Plane(origin=(-0.25, -71, 20.25), x_dir=(0.7071067811865557, 0.7071067811865394, 0), z_dir=(0, 0, -1))) as fillet8_piece_1:
        with BuildLine():
            CenterArc((FILLET8_R * 0.414213562373, FILLET8_R), FILLET8_R, 225, 45)
            Line((-FILLET8_R * 0.292893218813, FILLET8_R * 0.292893218813), (0, 0))
            Line((0, 0), (FILLET8_R * 0.414213562373, 0))
        make_face()
    extrude(amount=40.5)
    # the kernel refuses this fillet: 2.5 mm, written as the material it takes off along each edge
    with BuildSketch(Plane(origin=(-4.25, -67.9999, 22.838834765), x_dir=(0, -1, 0), z_dir=(0, 0, -1))) as fillet8_2_piece_1:
        with BuildLine():
            CenterArc((FILLET8_R * 0.414213562373, -FILLET8_R), FILLET8_R, 90, 45)
            Line((-FILLET8_R * 0.292893218813, -FILLET8_R * 0.292893218813), (0, 0))
            Line((0, 0), (FILLET8_R * 0.414213562373, 0))
        make_face()
    extrude(amount=45.67766953, mode=Mode.SUBTRACT)
    with BuildSketch(Plane(origin=(63.65, -67.9999, 22.838834765), x_dir=(0, -1, 0), z_dir=(0, 0, -1))) as fillet8_2_piece_2:
        with BuildLine():
            CenterArc((FILLET8_R * 0.414213562373, FILLET8_R), FILLET8_R, 225, 45)
            Line((-FILLET8_R * 0.292893218813, FILLET8_R * 0.292893218813), (0, 0))
            Line((0, 0), (FILLET8_R * 0.414213562373, 0))
        make_face()
    extrude(amount=45.67766953, mode=Mode.SUBTRACT)

    # Sketch32 → Cut-Extrude14 (cut, two sides: drawn at the far end of the back side and taken through both)
    with BuildSketch(Plane(origin=(59.4, 0, 0), x_dir=(0, 0, -1), z_dir=(1, 0, 0)).offset(-CUT_EXTRUDE14_DEPTH_BACK)):
        with Locations((0, -49.64)):
            Rectangle(SKETCH32_W, SKETCH32_H)
    extrude(amount=CUT_EXTRUDE14_DEPTH + CUT_EXTRUDE14_DEPTH_BACK, mode=Mode.SUBTRACT)

    # Fillet9
    fillet9_edges = [part.edges().sort_by_distance(p)[0] for p in [
        (57.65, -38.03, 15.25),
        (57.65, -61.25, 15.25),
        (57.65, -61.25, -15.25),
        (57.65, -38.03, -15.25),
    ]]
    fillet(fillet9_edges, radius=FILLET9_R)

    # Sketch33 → Cut-Extrude15 (cut)
    with BuildSketch(Plane(origin=(59.4, 0, 0), x_dir=(0, 0, -1), z_dir=(1, 0, 0))):
        with BuildLine():
            Line((-18.25, -56.25), (-16.75, -56.25))
            Line((-16.75, -56.25), (-16.75, -43.03))
            ThreePointArc((-16.75, -43.03), (-14.846194078, -38.433805922), (-10.25, -36.53))
            Line((-10.25, -36.53), (10.25, -36.53))
            ThreePointArc((10.25, -36.53), (14.846194078, -38.433805922), (16.75, -43.03))
            Line((16.75, -43.03), (16.75, -56.25))
            Line((16.75, -56.25), (18.25, -56.25))
            Line((18.25, -56.25), (18.25, -43.03))
            ThreePointArc((18.25, -43.03), (15.906854249, -37.373145751), (10.25, -35.03))
            Line((10.25, -35.03), (-10.25, -35.03))
            ThreePointArc((-10.25, -35.03), (-15.906854249, -37.373145751), (-18.25, -43.03))
            Line((-18.25, -43.03), (-18.25, -56.25))
        make_face()
    extrude(amount=-CUT_EXTRUDE15_DEPTH, mode=Mode.SUBTRACT)

    # Sketch34 → Cut-Extrude16 (cut)
    with BuildSketch(Plane(origin=(59.4, 0, 0), x_dir=(0, 0, -1), z_dir=(1, 0, 0))):
        with Locations((0, 8.125)):
            Circle(SKETCH34_R)
        with Locations((8.125, 0)):
            Circle(SKETCH34_R)
        with Locations((0, -8.125)):
            Circle(SKETCH34_R)
        with Locations((-8.125, 0)):
            Circle(SKETCH34_R)
    extrude(amount=-CUT_EXTRUDE16_DEPTH, mode=Mode.SUBTRACT)

    # Sketch35 → Cut-Extrude17 (cut, two sides: drawn at the far end of the back side and taken through both)
    with BuildSketch(Plane.XY.offset(20.25).offset(-CUT_EXTRUDE17_DEPTH_BACK)):
        with Locations((48.15, -8.875)):
            Rectangle(SKETCH35_W, SKETCH35_H)
    extrude(amount=CUT_EXTRUDE17_DEPTH + CUT_EXTRUDE17_DEPTH_BACK, mode=Mode.SUBTRACT)

    # Fillet10
    fillet10_edges = [part.edges().sort_by_distance(p)[0] for p in [
        (40.65, -12.858590015, 27.585458991),
        (55.65, -12.013821491, 24.659094982),
    ]]
    fillet(fillet10_edges, radius=FILLET10_R)

    # Fillet11
    fillet11_edges = [part.edges().sort_by_distance(p)[0] for p in [
        (40.65, -11.773525783, 23.826686232),
    ]]
    fillet(fillet11_edges, radius=FILLET11_R)

    # Sketch36 → Cut-Extrude18 (cut, through all)
    with BuildSketch(Plane(origin=(1.02, 0, 0), x_dir=(0, 0, -1), z_dir=(1, 0, 0))):
        with Locations(Location((10.25, -41.34, 0), (0, 0, 180))):
            Circle(SKETCH36_R)
        with Locations(Location((10.25, -16.89, 0), (0, 0, 180))):
            Circle(SKETCH36_R)
        with Locations(Location((-10.25, -16.89, 0), (0, 0, 180))):
            Circle(SKETCH36_R)
        with Locations(Location((-10.25, -41.34, 0), (0, 0, 180))):
            Circle(SKETCH36_R)
    extrude(amount=-CUT_EXTRUDE18_DEPTH, mode=Mode.SUBTRACT)

    # Sketch39 → Cut-Extrude24 (cut, two sides: drawn at the far end of the back side and taken through both)
    with BuildSketch(Plane.XZ.offset(63.25).offset(-CUT_EXTRUDE24_DEPTH_BACK)):
        with Locations((23.881285679, 9.548177142)):
            Rectangle(SKETCH39_W, SKETCH39_H)
        with BuildLine():
            Line((31.935379733, -24.234561595), (31.935379733, 24.234561595))
            ThreePointArc((31.935379733, 24.234561595), (34.003152314, 24.186630775), (36.07, 24.108391051))
            Line((36.07, 24.108391051), (36.07, 26.0079354))
            Line((36.07, 26.0079354), (40.07, 26.0079354))
            Line((40.07, 26.0079354), (40.07, 23.870636644))
            ThreePointArc((40.07, 23.870636644), (40.607246532, 23.830008061), (41.144333988, 23.787328054))
            Line((41.144333988, 23.787328054), (41.144333988, -23.787328054))
            ThreePointArc((41.144333988, -23.787328054), (40.607246532, -23.830008061), (40.07, -23.870636644))
            Line((40.07, -23.870636644), (40.07, -26.0079354))
            Line((40.07, -26.0079354), (36.07, -26.0079354))
            Line((36.07, -26.0079354), (36.07, -24.108391051))
            ThreePointArc((36.07, -24.108391051), (34.003152314, -24.186630775), (31.935379733, -24.234561595))
        make_face(mode=Mode.SUBTRACT)
    extrude(amount=CUT_EXTRUDE24_DEPTH + CUT_EXTRUDE24_DEPTH_BACK, mode=Mode.SUBTRACT)

    # Sketch40 → Cut-Extrude25 (cut, two sides: drawn at the far end of the back side and taken through both)
    with BuildSketch(Plane(origin=(0, -19.75, 0), x_dir=(1, 0, 0), z_dir=(0, 1, 0)).offset(-CUT_EXTRUDE25_DEPTH_BACK)):
        with Locations((39.101577686, 6.308953447)):
            Rectangle(SKETCH40_W, SKETCH40_H)
    extrude(amount=CUT_EXTRUDE25_DEPTH + CUT_EXTRUDE25_DEPTH_BACK, mode=Mode.SUBTRACT)

    # Sketch41 → Cut-Extrude26 (cut, through all)
    with BuildSketch(Plane(origin=(0, -23.25, 0), x_dir=(1, 0, 0), z_dir=(0, 1, 0))):
        Polygon((36.07, -24.108391051), (36.17, -24.103871284), (36.17, -25.9079354), (39.97, -25.9079354), (39.97, -23.878007003), (40.07, -23.870636644), (40.07, -26.0079354), (36.07, -26.0079354), align=None)
        Polygon((36.07, 24.108391051), (36.17, 24.103871284), (36.17, 25.9079354), (39.97, 25.9079354), (39.97, 23.878007003), (40.07, 23.870636644), (40.07, 26.0079354), (36.07, 26.0079354), align=None)
    extrude(amount=-CUT_EXTRUDE26_DEPTH, mode=Mode.SUBTRACT)

    # Fillet12
    # the kernel refuses this fillet: 10 mm, written as the material it adds along each edge
    with BuildSketch(Plane(origin=(29.7, -63.25, -116.828064758), x_dir=(-0.09644613300635278, 0, 0.9953382055503148), z_dir=(-0.9953382055503148, 0, -0.09644613300635278))) as fillet12_piece_1_section:
        with BuildLine():
            CenterArc((133.080336958, -10), FILLET12_R, 36.869897646, 53.130102354)
            Line((133.080336958, 0), (141.080336958, 0))
            Line((141.080336958, 0), (141.080336958, -4))
        make_face()
    fillet12_piece_1 = revolve(axis=Axis((29.7, -63.25, -116.828064758), (0, 1, 0)), revolution_arc=17.87227661, mode=Mode.PRIVATE)
    fillet12_piece_1 = split(fillet12_piece_1, bisect_by=Plane(origin=(40.07, -64.287839546, 20.472574235), z_dir=(-1, 0, 0)), keep=Keep.TOP, mode=Mode.PRIVATE)
    fillet12_piece_1 = split(fillet12_piece_1, bisect_by=Plane(origin=(36.07, -64.287839546, 20.472574235), z_dir=(1, 0, 0)), keep=Keep.TOP, mode=Mode.PRIVATE)
    add(fillet12_piece_1)
    with BuildSketch(Plane(origin=(29.7, -63.25, 116.828064758), x_dir=(0.21367351936506734, 0, -0.9769051269811957), z_dir=(0.9769051269811957, 0, 0.21367351936506734))) as fillet12_piece_2_section:
        with BuildLine():
            CenterArc((133.080336958, -10), FILLET12_R, 36.869897646, 53.130102354)
            Line((141.080336958, -4), (141.080336958, 0))
            Line((141.080336958, 0), (133.080336958, 0))
        make_face()
    fillet12_piece_2 = revolve(axis=Axis((29.7, -63.25, 116.828064758), (0, 1, 0)), revolution_arc=17.87227661, mode=Mode.PRIVATE)
    fillet12_piece_2 = split(fillet12_piece_2, bisect_by=Plane(origin=(40.07, -64.287839546, -20.472574235), z_dir=(-1, 0, 0)), keep=Keep.TOP, mode=Mode.PRIVATE)
    fillet12_piece_2 = split(fillet12_piece_2, bisect_by=Plane(origin=(36.07, -64.287839546, -20.472574235), z_dir=(1, 0, 0)), keep=Keep.TOP, mode=Mode.PRIVATE)
    add(fillet12_piece_2)

    # Sketch42 → Cut-Extrude27 (cut)
    with BuildSketch(Plane(origin=(0, -23.25, 0), x_dir=(1, 0, 0), z_dir=(0, 1, 0))):
        with BuildLine():
            Line((36.07, -24.108391051), (36.17, -24.103871284))
            Line((36.17, -24.103871284), (36.17, -25.9079354))
            Line((36.17, -25.9079354), (39.97, -25.9079354))
            Line((39.97, -25.9079354), (39.97, -23.878007003))
            Line((39.97, -23.878007003), (40.07, -23.870636644))
            ThreePointArc((40.07, -23.870636644), (40.570068675, -23.832886053), (41.07, -23.793358134))
            Line((41.07, -23.793358134), (41.07, 23.793358134))
            ThreePointArc((41.07, 23.793358134), (40.570068675, 23.832886053), (40.07, 23.870636644))
            Line((40.07, 23.870636644), (39.97, 23.878007003))
            Line((39.97, 23.878007003), (39.97, 25.9079354))
            Line((39.97, 25.9079354), (36.17, 25.9079354))
            Line((36.17, 25.9079354), (36.17, 24.103871284))
            Line((36.17, 24.103871284), (36.07, 24.108391051))
            ThreePointArc((36.07, 24.108391051), (35.570036929, 24.130099754), (35.07, 24.150034875))
            Line((35.07, 24.150034875), (35.07, -24.150034875))
            ThreePointArc((35.07, -24.150034875), (35.570036929, -24.130099754), (36.07, -24.108391051))
        make_face()
    extrude(amount=-CUT_EXTRUDE27_DEPTH, mode=Mode.SUBTRACT)

    # Fillet13
    fillet13_edges = [part.edges().sort_by_distance(p)[0] for p in [
        (40.07, -45.75, 23.870636644),
        (36.07, -45.75, 24.108391051),
        (36.07, -45.75, -24.108391051),
        (40.07, -45.75, -23.870636644),
    ]]
    fillet(fillet13_edges, radius=FILLET13_R)


solid = part.part
